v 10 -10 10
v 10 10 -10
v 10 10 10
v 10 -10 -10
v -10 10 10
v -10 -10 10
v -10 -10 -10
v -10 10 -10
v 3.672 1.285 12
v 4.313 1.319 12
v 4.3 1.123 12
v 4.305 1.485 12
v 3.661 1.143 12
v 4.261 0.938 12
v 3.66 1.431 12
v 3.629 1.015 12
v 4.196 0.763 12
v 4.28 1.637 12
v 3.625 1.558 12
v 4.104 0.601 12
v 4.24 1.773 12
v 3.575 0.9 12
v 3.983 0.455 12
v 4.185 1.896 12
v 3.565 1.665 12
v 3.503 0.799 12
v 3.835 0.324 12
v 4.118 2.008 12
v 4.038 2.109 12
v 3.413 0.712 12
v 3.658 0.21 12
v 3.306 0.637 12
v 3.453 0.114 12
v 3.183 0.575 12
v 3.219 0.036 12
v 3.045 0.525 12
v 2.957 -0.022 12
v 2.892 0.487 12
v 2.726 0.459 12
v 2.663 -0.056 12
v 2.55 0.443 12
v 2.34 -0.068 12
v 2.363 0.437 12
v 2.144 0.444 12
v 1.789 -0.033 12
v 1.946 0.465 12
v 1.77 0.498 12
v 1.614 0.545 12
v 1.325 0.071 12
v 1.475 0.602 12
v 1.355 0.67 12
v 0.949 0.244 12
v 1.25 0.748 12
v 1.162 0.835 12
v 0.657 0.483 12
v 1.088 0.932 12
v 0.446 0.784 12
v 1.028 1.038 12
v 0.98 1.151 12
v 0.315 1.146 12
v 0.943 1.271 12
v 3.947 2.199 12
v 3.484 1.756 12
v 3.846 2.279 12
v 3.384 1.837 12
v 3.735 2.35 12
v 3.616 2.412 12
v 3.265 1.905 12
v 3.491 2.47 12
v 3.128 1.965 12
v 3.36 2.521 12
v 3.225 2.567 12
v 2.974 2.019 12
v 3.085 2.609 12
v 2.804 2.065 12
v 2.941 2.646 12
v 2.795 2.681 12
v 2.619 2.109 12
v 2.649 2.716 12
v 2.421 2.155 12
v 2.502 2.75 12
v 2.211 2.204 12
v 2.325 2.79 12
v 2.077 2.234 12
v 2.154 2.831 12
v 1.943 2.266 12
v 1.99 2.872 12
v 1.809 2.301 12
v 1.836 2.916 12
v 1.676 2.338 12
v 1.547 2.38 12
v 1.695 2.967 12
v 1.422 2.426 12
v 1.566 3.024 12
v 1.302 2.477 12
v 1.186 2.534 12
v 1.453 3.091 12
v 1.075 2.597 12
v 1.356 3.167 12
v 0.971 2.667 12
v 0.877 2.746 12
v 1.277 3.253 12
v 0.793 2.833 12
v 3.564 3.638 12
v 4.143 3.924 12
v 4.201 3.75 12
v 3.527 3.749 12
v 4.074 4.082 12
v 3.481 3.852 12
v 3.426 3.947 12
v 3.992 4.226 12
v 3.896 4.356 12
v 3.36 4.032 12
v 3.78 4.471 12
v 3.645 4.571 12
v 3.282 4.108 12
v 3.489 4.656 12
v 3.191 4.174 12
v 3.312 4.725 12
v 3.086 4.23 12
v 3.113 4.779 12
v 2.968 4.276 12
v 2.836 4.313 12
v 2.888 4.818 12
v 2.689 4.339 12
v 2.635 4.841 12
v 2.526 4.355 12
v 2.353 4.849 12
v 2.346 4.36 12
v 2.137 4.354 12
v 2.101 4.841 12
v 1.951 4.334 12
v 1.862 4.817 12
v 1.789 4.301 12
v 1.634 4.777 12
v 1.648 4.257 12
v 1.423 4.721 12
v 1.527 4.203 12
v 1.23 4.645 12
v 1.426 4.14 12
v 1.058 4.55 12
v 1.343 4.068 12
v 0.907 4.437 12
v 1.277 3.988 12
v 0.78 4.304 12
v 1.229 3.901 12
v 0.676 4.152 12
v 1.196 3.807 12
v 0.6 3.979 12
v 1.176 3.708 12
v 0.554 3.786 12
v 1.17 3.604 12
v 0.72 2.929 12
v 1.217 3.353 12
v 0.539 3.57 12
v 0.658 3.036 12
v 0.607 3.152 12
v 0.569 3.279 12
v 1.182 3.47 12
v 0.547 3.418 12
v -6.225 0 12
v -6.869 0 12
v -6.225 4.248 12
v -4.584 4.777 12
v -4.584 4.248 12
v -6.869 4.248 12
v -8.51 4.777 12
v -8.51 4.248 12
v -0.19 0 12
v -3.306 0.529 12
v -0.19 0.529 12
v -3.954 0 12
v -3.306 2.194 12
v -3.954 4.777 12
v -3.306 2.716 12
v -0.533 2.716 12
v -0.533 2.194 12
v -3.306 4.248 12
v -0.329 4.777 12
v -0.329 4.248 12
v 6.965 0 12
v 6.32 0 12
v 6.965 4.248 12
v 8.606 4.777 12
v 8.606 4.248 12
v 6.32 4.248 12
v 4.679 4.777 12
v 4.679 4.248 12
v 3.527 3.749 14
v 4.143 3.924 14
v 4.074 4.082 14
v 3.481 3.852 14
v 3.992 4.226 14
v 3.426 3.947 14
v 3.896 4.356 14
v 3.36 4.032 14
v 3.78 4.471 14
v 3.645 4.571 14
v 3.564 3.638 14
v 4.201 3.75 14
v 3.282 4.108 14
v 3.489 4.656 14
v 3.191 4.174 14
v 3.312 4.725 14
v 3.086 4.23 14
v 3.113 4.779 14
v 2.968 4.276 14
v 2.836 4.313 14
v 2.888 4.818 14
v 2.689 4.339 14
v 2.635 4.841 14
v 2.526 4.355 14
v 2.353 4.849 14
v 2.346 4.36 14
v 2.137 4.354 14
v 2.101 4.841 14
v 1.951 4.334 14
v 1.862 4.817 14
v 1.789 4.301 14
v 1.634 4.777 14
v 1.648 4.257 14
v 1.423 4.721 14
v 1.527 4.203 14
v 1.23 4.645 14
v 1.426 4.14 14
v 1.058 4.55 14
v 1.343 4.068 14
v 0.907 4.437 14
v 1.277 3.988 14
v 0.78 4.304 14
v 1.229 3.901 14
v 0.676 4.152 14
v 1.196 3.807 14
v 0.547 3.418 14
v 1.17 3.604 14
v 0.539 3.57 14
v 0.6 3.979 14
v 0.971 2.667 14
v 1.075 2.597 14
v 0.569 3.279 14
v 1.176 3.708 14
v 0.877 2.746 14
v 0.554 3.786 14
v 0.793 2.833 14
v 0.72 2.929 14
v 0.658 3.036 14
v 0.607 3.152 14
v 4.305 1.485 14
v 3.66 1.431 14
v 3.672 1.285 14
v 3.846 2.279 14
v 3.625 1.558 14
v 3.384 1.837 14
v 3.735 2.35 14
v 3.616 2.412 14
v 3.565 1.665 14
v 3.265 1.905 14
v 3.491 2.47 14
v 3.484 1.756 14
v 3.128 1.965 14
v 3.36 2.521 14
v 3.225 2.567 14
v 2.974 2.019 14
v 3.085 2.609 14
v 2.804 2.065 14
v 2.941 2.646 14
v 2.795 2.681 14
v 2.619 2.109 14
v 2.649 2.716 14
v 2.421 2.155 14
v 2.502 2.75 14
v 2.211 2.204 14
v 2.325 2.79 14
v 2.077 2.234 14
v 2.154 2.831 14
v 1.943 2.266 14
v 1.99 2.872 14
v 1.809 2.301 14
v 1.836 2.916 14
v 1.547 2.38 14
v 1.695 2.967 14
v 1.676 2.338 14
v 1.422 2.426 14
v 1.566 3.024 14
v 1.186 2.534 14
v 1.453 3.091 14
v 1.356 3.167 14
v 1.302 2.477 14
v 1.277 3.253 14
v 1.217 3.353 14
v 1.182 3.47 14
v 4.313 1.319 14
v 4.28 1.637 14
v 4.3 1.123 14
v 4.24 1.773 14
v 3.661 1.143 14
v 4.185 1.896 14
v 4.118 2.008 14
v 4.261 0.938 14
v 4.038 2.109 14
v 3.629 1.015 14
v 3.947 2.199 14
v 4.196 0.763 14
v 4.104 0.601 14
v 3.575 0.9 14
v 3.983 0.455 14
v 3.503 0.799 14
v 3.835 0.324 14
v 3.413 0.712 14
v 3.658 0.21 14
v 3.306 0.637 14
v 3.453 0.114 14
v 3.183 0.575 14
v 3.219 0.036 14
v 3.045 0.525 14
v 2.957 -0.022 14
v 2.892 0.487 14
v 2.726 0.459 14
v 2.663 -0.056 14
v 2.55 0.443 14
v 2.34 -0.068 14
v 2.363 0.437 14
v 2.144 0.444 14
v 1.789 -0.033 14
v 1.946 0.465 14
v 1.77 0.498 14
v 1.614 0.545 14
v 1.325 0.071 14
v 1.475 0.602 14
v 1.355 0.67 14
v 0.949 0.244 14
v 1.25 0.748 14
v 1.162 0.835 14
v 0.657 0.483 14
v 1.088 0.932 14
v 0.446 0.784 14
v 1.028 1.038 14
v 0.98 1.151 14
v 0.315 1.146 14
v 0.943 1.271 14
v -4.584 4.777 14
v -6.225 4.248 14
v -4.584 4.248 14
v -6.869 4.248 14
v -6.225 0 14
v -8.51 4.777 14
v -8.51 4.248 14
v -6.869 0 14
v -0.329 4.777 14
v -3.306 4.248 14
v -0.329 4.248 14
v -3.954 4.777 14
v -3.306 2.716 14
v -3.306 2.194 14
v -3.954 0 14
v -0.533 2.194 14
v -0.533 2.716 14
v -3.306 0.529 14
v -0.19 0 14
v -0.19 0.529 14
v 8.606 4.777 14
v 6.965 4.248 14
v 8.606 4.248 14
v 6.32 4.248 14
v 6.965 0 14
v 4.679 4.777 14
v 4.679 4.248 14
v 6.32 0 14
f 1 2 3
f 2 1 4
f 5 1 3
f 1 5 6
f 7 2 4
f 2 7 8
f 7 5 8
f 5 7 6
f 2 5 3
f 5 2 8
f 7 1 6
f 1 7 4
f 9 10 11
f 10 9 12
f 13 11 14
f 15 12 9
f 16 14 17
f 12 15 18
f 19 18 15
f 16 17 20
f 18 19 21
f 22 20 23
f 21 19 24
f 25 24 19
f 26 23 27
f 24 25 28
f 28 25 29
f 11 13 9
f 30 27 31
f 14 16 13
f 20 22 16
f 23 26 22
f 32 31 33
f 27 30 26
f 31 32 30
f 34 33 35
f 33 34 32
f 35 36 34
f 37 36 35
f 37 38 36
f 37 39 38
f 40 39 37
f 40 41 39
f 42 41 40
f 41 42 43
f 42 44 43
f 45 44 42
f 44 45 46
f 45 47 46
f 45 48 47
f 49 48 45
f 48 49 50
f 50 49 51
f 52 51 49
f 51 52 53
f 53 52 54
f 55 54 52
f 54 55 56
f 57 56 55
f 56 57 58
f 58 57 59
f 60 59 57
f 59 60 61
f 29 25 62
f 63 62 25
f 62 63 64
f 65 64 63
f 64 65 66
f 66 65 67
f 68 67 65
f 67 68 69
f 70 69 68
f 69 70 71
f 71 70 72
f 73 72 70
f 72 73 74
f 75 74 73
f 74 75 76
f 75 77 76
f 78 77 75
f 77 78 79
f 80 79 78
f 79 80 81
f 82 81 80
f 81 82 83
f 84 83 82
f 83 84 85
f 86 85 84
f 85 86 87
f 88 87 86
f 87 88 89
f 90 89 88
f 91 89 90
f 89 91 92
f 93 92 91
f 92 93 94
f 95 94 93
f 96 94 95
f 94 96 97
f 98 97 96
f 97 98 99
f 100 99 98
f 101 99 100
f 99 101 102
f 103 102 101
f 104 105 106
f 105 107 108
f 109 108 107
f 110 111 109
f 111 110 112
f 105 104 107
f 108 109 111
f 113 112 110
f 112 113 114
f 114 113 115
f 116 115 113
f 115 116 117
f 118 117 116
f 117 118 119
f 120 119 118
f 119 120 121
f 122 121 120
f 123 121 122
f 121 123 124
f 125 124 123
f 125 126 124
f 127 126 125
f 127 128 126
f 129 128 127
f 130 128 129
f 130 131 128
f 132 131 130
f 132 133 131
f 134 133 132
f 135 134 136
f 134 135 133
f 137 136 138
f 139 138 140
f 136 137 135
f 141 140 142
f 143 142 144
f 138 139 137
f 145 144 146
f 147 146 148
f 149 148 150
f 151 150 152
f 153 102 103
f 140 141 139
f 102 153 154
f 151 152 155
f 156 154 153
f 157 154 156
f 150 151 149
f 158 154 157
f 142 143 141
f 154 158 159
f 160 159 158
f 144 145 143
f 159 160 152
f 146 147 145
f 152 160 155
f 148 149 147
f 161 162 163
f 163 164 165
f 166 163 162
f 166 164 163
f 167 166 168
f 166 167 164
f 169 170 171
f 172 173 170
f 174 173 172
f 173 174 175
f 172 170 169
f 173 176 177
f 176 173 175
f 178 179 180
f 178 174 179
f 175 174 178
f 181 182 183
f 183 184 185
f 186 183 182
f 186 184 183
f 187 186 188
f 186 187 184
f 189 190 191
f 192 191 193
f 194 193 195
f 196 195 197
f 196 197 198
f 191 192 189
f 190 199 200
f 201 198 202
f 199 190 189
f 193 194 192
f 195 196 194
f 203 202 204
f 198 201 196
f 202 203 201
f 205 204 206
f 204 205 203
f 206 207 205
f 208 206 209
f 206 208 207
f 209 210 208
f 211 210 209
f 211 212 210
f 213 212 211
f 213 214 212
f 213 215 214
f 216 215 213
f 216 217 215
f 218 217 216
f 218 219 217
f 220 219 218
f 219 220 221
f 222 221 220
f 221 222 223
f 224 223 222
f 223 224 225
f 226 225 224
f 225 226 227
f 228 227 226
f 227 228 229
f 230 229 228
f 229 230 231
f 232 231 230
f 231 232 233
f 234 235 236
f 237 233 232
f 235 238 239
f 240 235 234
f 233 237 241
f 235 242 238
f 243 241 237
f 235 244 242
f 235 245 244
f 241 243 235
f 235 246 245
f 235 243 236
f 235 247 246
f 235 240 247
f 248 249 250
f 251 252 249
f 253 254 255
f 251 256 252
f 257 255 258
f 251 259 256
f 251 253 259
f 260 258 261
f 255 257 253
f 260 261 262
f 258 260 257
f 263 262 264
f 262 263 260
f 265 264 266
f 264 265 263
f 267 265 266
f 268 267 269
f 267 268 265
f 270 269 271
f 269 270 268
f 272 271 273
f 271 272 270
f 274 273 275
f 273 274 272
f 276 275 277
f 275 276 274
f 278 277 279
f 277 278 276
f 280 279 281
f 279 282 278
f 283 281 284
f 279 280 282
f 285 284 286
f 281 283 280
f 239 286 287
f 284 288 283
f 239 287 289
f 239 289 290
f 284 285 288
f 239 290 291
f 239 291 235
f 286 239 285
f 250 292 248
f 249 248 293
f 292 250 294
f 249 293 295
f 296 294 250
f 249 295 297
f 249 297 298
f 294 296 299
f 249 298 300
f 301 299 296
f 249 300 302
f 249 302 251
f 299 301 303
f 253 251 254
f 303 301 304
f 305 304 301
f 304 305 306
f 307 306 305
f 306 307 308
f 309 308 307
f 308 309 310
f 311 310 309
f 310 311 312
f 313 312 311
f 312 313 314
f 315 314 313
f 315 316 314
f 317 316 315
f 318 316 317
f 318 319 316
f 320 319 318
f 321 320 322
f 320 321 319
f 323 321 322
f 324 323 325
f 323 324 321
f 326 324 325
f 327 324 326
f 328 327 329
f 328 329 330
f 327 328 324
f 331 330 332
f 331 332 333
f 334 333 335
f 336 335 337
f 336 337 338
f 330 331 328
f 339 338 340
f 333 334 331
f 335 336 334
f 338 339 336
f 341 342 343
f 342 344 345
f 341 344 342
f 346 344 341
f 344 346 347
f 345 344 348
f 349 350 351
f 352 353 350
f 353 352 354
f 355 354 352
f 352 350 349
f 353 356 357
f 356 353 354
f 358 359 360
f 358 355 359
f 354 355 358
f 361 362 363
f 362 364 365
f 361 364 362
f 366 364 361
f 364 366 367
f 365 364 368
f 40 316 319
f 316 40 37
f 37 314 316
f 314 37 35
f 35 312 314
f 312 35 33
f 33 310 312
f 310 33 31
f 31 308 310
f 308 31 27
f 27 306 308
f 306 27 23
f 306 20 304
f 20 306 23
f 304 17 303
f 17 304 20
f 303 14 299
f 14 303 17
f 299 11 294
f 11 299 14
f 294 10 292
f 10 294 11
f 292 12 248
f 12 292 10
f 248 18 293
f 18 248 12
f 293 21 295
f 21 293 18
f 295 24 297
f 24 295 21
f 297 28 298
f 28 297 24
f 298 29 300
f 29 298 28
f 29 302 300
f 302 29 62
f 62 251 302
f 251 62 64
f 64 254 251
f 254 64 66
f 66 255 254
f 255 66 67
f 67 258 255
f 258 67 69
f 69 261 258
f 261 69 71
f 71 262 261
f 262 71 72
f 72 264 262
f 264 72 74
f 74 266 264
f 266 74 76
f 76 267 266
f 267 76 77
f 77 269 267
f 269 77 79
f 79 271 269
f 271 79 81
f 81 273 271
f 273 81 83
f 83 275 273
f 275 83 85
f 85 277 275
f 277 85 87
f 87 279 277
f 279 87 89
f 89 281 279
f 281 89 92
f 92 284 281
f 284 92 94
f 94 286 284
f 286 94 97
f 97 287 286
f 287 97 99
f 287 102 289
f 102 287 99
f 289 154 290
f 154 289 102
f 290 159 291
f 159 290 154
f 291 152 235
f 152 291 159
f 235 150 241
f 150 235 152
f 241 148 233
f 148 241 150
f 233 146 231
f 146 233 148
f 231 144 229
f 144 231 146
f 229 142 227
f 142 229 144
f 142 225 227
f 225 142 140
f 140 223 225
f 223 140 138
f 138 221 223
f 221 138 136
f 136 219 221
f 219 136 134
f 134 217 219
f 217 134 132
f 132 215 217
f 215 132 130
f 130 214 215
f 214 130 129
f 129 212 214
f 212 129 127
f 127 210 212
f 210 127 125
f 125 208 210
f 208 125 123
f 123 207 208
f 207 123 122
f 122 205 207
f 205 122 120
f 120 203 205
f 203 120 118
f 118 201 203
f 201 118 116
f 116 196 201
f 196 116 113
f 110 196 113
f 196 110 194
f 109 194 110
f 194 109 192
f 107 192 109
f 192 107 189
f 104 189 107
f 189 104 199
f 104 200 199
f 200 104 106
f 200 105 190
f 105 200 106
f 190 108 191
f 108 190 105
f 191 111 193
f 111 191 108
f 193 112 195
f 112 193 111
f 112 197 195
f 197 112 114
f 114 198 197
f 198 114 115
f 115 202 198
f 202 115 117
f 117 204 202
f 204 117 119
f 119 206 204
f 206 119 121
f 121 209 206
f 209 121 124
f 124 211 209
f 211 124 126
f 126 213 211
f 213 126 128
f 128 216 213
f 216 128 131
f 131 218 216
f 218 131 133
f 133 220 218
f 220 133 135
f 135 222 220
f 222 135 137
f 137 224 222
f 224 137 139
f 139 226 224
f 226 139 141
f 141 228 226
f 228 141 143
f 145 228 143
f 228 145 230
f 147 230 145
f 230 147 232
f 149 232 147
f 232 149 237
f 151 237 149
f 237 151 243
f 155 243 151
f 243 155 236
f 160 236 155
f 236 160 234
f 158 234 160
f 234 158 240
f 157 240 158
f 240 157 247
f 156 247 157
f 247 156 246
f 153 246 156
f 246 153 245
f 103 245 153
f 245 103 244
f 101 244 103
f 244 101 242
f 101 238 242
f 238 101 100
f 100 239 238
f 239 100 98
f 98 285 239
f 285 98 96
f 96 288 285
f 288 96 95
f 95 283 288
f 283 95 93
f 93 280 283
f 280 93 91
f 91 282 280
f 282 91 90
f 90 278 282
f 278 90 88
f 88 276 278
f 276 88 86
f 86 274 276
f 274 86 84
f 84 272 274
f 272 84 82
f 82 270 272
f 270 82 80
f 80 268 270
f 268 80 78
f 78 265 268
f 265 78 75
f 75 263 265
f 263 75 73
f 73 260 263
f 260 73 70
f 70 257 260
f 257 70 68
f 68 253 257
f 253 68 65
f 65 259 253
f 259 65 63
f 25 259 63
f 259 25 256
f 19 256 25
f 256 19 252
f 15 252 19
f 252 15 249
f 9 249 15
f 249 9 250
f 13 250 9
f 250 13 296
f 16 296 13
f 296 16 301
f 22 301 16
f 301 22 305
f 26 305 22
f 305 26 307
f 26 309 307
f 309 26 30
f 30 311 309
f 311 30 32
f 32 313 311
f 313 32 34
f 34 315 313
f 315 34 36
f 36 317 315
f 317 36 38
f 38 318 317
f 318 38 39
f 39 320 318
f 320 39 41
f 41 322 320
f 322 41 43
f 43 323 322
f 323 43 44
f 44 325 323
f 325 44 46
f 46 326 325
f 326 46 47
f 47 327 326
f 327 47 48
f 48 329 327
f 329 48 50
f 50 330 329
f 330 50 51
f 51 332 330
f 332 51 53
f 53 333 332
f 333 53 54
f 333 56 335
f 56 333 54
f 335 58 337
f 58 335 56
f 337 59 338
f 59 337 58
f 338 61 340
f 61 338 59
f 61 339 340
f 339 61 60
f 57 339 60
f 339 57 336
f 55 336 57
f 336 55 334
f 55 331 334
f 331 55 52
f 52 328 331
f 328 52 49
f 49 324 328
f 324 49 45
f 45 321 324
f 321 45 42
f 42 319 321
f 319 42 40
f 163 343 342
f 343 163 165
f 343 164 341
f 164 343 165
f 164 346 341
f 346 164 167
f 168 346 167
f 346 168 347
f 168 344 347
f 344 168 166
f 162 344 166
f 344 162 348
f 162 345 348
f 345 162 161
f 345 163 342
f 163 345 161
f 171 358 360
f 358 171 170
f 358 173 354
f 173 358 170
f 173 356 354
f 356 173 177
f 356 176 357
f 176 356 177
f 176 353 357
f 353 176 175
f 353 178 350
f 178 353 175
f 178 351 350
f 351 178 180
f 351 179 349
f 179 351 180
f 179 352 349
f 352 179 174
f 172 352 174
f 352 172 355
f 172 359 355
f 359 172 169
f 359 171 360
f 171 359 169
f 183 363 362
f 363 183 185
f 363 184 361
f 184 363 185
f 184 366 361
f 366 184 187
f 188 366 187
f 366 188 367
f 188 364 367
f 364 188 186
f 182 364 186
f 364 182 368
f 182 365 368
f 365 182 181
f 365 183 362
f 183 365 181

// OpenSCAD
// Test file to verify OpenSCAD is working correctly
// This should render as a red cube, not a sphere

color("red") 
cube([20, 20, 20], center=true);

// Add text to prove this is rendering correctly
color("white")
translate([0, 0, 12])
linear_extrude(height=2)
text("TEST", size=5, halign="center");
